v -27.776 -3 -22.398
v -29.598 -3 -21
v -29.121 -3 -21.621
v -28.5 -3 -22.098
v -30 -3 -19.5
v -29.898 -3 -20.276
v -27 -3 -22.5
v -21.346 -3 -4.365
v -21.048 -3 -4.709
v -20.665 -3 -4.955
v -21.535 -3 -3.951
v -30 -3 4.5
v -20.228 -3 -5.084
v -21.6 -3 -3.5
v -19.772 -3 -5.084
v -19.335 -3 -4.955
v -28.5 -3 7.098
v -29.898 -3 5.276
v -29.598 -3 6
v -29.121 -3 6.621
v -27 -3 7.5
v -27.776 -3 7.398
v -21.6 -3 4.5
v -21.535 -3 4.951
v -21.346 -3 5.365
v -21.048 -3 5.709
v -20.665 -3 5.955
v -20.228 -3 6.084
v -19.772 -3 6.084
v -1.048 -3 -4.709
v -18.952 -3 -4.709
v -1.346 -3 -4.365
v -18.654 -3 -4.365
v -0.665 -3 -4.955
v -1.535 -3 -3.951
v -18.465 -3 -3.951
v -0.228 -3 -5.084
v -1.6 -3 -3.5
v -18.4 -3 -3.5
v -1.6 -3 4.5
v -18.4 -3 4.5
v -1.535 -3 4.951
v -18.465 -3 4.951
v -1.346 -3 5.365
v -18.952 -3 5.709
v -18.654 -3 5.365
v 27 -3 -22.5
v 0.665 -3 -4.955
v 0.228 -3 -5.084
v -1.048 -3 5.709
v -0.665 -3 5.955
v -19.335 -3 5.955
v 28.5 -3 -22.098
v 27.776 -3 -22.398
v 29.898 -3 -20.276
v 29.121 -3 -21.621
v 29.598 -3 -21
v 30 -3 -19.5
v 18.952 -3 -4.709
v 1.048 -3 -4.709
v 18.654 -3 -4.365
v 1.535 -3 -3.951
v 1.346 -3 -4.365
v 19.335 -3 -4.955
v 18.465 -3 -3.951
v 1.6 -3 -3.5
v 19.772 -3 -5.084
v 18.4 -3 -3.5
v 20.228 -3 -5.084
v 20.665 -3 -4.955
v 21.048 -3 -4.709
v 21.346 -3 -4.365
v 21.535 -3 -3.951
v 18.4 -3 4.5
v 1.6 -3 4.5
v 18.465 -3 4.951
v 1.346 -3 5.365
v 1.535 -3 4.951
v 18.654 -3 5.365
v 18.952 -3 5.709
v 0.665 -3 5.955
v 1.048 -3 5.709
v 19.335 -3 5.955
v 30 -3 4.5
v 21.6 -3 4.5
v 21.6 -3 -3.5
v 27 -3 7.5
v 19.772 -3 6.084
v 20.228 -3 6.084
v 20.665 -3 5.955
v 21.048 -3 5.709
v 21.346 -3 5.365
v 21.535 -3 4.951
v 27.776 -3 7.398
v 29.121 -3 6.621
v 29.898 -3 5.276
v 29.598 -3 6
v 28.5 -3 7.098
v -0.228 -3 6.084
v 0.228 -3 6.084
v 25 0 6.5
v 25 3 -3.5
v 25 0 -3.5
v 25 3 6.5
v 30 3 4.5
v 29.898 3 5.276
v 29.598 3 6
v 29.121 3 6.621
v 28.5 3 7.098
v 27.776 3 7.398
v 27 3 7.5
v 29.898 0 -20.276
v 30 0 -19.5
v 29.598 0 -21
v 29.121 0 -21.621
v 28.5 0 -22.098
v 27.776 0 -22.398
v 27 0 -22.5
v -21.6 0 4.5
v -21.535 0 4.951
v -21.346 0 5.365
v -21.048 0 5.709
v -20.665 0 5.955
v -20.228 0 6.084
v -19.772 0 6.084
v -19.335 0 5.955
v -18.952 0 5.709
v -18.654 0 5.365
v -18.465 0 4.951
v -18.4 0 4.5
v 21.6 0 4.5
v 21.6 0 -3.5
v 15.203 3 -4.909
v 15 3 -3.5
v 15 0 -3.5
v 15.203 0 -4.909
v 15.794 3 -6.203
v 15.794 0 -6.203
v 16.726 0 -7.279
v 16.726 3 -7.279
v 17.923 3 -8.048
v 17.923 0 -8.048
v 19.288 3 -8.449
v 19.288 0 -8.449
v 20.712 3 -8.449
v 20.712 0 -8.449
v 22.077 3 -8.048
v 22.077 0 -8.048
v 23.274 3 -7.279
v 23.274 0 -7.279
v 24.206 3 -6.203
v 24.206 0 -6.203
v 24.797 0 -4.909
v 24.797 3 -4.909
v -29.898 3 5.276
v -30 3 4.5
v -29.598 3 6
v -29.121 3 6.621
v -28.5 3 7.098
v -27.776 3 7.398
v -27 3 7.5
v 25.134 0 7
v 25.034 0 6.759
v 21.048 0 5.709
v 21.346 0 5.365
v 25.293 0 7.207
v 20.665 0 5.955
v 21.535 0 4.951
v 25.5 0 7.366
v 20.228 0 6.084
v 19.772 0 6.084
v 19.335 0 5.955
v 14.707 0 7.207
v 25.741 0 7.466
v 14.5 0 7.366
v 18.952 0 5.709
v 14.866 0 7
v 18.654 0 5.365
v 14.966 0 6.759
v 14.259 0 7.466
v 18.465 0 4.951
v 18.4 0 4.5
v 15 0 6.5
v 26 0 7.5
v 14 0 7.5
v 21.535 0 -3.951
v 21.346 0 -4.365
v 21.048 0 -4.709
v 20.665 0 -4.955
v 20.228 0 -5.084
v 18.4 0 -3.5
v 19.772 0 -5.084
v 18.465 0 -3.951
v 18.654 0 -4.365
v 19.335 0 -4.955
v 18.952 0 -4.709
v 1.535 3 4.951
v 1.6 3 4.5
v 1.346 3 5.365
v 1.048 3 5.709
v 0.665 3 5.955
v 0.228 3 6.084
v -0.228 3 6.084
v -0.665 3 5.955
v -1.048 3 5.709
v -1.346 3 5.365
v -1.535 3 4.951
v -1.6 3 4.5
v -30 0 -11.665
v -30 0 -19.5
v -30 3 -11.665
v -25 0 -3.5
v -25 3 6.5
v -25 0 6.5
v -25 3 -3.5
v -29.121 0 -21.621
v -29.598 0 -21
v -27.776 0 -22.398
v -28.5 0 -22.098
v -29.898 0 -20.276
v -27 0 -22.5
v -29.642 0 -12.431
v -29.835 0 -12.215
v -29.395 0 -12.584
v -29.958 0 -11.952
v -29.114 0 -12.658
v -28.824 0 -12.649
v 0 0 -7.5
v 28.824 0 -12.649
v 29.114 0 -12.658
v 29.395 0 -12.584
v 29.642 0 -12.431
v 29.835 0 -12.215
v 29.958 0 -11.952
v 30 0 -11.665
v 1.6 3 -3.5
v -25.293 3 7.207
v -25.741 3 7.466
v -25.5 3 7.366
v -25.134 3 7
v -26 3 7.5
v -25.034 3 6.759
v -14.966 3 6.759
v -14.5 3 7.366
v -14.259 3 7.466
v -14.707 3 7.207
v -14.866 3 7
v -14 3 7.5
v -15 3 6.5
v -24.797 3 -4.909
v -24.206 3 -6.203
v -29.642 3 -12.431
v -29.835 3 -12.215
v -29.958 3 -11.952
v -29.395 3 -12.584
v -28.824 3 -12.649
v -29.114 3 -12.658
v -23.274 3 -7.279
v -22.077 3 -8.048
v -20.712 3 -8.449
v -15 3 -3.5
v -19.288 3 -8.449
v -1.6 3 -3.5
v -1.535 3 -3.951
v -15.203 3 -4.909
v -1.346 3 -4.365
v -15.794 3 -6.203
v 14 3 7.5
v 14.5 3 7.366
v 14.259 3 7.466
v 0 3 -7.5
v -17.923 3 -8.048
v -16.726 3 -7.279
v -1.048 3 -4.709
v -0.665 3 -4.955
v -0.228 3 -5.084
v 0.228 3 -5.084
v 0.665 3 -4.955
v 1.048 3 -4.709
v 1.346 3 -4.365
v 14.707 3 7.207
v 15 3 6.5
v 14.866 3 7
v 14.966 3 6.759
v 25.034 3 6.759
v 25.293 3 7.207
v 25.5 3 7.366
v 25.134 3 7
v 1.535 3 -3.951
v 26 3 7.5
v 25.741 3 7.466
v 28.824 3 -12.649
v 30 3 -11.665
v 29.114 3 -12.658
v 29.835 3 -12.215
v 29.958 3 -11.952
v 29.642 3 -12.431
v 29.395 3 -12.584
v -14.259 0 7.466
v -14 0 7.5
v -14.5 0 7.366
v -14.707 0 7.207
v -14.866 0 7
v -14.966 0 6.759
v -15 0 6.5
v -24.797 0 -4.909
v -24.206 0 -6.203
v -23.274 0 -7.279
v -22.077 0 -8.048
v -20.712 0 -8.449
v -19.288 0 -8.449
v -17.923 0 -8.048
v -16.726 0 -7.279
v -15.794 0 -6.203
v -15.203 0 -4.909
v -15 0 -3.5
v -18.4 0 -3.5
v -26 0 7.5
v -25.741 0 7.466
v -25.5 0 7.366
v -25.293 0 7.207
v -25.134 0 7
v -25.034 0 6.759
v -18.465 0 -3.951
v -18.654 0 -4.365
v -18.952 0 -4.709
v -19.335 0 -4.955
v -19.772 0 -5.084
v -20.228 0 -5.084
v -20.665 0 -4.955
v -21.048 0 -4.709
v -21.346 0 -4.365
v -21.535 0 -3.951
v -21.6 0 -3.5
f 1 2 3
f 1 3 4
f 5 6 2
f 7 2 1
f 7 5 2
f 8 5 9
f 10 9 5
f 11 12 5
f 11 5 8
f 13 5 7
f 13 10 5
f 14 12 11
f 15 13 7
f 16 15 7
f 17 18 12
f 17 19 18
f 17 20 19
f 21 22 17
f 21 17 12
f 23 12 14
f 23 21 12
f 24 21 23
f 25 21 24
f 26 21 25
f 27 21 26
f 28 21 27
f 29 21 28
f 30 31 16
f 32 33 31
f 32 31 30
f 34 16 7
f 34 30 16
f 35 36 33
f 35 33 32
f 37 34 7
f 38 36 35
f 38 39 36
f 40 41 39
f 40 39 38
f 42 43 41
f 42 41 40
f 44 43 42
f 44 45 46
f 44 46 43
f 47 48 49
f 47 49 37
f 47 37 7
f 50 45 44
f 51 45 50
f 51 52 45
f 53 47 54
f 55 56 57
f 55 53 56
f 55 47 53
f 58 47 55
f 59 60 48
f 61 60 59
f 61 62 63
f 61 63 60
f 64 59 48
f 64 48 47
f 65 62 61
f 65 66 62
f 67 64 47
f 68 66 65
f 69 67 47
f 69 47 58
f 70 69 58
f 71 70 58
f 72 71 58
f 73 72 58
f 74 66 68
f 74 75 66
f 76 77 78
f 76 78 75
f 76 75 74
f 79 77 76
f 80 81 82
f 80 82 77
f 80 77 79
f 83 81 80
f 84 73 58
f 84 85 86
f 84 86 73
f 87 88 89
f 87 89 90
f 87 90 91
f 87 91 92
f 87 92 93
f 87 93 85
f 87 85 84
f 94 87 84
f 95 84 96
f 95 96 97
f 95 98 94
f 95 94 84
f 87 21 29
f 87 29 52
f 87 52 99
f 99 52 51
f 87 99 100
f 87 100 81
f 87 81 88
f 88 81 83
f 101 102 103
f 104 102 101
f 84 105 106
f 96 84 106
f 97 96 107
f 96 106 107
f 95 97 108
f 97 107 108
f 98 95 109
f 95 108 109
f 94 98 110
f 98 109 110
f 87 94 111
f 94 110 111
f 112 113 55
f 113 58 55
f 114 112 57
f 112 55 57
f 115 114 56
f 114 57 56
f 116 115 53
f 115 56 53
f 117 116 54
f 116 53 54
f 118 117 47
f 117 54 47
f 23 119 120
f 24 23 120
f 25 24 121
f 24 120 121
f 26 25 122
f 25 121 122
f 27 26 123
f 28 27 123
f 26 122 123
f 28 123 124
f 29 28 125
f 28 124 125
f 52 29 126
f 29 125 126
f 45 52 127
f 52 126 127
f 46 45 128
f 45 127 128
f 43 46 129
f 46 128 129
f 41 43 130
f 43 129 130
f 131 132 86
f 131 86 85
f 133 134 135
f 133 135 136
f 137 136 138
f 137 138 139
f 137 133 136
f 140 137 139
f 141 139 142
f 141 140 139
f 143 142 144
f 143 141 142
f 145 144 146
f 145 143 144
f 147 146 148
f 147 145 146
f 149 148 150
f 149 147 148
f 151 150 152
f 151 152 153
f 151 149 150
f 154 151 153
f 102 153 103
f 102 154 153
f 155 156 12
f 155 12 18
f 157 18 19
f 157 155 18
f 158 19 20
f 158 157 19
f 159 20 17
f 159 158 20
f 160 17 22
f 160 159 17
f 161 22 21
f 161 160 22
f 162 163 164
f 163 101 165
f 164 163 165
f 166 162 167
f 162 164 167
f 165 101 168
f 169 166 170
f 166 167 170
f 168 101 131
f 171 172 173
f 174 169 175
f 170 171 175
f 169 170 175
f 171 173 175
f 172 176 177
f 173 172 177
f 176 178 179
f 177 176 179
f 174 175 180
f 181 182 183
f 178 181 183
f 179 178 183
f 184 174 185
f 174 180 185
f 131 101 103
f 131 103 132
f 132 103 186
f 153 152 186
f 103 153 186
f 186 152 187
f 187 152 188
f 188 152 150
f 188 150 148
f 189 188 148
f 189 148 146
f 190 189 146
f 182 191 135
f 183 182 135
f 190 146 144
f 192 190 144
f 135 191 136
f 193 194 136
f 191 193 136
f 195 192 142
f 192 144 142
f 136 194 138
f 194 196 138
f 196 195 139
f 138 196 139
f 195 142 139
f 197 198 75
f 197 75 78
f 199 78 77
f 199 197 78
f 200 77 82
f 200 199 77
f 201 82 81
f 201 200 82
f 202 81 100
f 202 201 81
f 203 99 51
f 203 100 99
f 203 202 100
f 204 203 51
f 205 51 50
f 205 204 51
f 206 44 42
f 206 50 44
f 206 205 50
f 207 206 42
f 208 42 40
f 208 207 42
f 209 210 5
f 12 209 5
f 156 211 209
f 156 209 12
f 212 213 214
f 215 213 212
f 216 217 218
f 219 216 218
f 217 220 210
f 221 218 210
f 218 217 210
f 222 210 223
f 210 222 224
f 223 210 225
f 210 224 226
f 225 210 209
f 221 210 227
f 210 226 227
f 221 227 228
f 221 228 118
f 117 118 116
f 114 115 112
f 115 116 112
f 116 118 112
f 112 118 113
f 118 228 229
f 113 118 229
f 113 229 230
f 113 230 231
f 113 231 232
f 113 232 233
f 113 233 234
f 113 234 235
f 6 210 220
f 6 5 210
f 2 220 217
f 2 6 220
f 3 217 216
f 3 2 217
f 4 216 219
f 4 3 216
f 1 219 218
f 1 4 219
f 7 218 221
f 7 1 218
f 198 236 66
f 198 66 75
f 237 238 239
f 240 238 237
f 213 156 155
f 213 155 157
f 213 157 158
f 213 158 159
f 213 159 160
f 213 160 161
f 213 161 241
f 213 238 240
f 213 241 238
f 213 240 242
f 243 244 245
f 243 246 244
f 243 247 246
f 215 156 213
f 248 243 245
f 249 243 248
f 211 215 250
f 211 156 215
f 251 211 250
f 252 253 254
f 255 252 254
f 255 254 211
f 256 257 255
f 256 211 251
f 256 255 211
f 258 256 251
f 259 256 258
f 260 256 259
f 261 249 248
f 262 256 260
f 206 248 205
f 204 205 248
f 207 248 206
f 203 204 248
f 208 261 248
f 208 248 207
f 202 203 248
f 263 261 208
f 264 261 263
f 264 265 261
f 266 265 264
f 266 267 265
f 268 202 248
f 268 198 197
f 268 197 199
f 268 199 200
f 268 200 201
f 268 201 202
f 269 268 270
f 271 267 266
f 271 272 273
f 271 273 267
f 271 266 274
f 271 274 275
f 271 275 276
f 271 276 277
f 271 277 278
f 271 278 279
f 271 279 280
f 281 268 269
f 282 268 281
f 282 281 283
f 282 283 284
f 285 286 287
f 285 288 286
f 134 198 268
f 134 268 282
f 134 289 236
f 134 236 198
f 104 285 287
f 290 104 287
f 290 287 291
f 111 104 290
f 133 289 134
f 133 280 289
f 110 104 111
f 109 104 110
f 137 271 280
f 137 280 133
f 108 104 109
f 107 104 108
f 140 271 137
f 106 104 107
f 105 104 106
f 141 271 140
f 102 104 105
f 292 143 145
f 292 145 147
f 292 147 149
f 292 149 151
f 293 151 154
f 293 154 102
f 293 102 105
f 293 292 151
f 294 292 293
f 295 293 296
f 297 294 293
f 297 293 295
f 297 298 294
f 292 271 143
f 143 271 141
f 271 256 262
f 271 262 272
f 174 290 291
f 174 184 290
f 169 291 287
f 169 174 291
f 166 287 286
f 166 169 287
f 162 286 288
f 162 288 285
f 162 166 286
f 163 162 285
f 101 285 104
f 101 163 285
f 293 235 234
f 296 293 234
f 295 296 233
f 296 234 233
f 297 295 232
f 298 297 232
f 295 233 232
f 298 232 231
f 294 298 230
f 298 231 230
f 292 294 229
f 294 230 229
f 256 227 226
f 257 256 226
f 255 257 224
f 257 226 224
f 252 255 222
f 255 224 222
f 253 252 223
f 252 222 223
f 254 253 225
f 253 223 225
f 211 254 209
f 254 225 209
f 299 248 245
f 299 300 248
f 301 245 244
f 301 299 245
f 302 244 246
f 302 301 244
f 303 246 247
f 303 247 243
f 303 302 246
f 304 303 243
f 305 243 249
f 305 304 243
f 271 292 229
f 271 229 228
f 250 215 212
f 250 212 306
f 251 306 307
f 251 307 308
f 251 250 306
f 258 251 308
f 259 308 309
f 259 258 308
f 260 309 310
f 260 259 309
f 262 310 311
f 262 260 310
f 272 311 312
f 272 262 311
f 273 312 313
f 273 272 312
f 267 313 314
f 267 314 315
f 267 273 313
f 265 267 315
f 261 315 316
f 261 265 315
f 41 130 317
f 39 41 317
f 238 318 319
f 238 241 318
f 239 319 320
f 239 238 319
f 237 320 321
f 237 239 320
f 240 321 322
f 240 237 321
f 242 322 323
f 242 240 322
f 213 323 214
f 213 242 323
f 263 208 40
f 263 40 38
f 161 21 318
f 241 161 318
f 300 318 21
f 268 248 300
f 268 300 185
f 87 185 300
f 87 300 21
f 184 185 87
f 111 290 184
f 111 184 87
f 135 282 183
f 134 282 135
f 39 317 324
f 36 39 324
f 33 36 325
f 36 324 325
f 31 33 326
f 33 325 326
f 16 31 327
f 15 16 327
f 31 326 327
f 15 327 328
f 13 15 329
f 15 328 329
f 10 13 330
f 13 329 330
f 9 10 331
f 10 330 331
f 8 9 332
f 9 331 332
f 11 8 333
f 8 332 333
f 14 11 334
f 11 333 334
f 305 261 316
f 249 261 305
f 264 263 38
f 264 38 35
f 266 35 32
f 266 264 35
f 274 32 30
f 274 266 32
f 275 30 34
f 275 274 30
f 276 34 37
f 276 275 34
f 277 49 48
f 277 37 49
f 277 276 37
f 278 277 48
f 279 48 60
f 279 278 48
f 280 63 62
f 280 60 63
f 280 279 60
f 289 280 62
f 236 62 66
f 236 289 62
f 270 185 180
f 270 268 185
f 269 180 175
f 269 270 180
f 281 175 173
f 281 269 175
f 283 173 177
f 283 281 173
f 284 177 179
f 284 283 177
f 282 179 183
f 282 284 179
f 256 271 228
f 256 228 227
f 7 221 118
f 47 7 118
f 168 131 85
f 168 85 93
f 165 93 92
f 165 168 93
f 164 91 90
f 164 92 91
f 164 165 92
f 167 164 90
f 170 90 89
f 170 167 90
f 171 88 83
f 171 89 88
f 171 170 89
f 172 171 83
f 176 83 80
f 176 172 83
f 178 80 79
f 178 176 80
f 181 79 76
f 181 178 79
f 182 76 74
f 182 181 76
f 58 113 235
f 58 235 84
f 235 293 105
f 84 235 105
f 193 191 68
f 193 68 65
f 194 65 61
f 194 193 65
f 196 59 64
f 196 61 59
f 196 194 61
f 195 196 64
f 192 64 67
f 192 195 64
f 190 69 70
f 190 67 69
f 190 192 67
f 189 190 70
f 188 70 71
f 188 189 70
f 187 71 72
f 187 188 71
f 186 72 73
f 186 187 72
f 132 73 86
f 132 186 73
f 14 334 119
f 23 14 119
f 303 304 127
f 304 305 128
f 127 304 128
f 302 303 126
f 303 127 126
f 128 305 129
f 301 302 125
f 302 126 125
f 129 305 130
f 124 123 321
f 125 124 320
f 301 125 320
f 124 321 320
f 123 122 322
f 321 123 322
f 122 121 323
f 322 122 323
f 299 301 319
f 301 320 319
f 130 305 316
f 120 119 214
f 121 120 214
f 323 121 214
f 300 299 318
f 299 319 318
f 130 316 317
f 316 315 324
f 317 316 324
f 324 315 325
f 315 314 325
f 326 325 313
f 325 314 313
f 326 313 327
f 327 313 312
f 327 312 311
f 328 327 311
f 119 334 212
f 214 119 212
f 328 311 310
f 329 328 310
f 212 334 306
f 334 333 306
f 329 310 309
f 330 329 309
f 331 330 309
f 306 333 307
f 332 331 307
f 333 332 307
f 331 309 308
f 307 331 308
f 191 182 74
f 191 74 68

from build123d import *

# Parameters (mm, degrees)
BOSS_EXTRUDE1_DEPTH = 3
SKETCH4_W           = 60
SKETCH4_H           = 30
BOSS_EXTRUDE2_DEPTH = 3
FILLET1_R           = 3
CUT_EXTRUDE1_DEPTH  = 38.976966704
BOSS_EXTRUDE3_DEPTH = 3
CUT_EXTRUDE2_DEPTH  = 3
FILLET2_R           = 1


with BuildPart() as part:
    # Sketch2 → Boss-Extrude1 (new body)
    with BuildSketch(Plane(origin=(0, 0, 0), x_dir=(1, 0, 0), z_dir=(0, 1, 0))):
        with BuildLine():
            Line((-30, -7.5), (30, -7.5))
            Line((30, -7.5), (30, 11.664728706))
            ThreePointArc((30, 11.664728706), (29.572172135, 12.484862261), (28.654761905, 12.60324384))
            ThreePointArc((28.654761905, 12.60324384), (0, 7.5), (-28.654761905, 12.60324384))
            ThreePointArc((-28.654761905, 12.60324384), (-29.572172135, 12.484862261), (-30, 11.664728706))
            Line((-30, 11.664728706), (-30, -7.5))
        make_face()
    extrude(amount=BOSS_EXTRUDE1_DEPTH)

    # Sketch4 → Boss-Extrude2 (add)
    with BuildSketch(Plane.XZ):
        with Locations((0, -7.5)):
            Rectangle(SKETCH4_W, SKETCH4_H)
    extrude(amount=BOSS_EXTRUDE2_DEPTH)

    # Fillet1
    fillet1_edges = [part.edges().sort_by_distance(p)[0] for p in [
        (30, -1.5, -22.5),
        (30, 0, 7.5),
        (-30, 0, 7.5),
        (-30, -1.5, -22.5),
    ]]
    fillet(fillet1_edges, radius=FILLET1_R)

    # Sketch5 → Cut-Extrude1 (cut, through all)
    with BuildSketch(Plane(origin=(0, 3, 0), x_dir=(1, 0, 0), z_dir=(0, 1, 0))):
        with BuildLine():
            Line((1.6, 3.5), (1.6, -4.5))
            ThreePointArc((1.6, -4.5), (0, -6.1), (-1.6, -4.5))
            Line((-1.6, -4.5), (-1.6, 3.5))
            ThreePointArc((-1.6, 3.5), (0, 5.1), (1.6, 3.5))
        make_face()
        with BuildLine():
            Line((21.6, 3.5), (21.6, -4.5))
            ThreePointArc((21.6, -4.5), (20, -6.1), (18.4, -4.5))
            Line((18.4, -4.5), (18.4, 3.5))
            ThreePointArc((18.4, 3.5), (20, 5.1), (21.6, 3.5))
        make_face()
        with BuildLine():
            Line((-21.6, 3.5), (-21.6, -4.5))
            ThreePointArc((-21.6, -4.5), (-20, -6.1), (-18.4, -4.5))
            Line((-18.4, -4.5), (-18.4, 3.5))
            ThreePointArc((-18.4, 3.5), (-20, 5.1), (-21.6, 3.5))
        make_face()
    extrude(amount=-CUT_EXTRUDE1_DEPTH, mode=Mode.SUBTRACT)

    # Sketch6 → Boss-Extrude3 (add)
    with BuildSketch(Plane(origin=(0, 3, 0), x_dir=(1, 0, 0), z_dir=(0, 1, 0))):
        with BuildLine():
            Line((0, 7.5), (-28.824143961, 12.649144601))
            ThreePointArc((-28.824143961, 12.649144601), (-29.64192833, 12.43149335), (-30, 11.664728706))
            Line((-30, 11.664728706), (-30, -4.5))
            ThreePointArc((-30, -4.5), (-29.121320344, -6.621320344), (-27, -7.5))
            Line((-27, -7.5), (27, -7.5))
            ThreePointArc((27, -7.5), (29.121320344, -6.621320344), (30, -4.5))
            Line((30, -4.5), (30, 11.664728706))
            ThreePointArc((30, 11.664728706), (29.64192833, 12.43149335), (28.824143961, 12.649144601))
            Line((28.824143961, 12.649144601), (0, 7.5))
        make_face()
        with BuildLine():
            Line((-18.4, -4.5), (-18.4, 3.5))
            ThreePointArc((-18.4, 3.5), (-20, 5.1), (-21.6, 3.5))
            Line((-21.6, 3.5), (-21.6, -4.5))
            ThreePointArc((-21.6, -4.5), (-20, -6.1), (-18.4, -4.5))
        make_face(mode=Mode.SUBTRACT)
        with BuildLine():
            Line((1.6, -4.5), (1.6, 3.5))
            ThreePointArc((1.6, 3.5), (0, 5.1), (-1.6, 3.5))
            Line((-1.6, 3.5), (-1.6, -4.5))
            ThreePointArc((-1.6, -4.5), (0, -6.1), (1.6, -4.5))
        make_face(mode=Mode.SUBTRACT)
        with BuildLine():
            Line((21.6, -4.5), (21.6, 3.5))
            ThreePointArc((21.6, 3.5), (20, 5.1), (18.4, 3.5))
            Line((18.4, 3.5), (18.4, -4.5))
            ThreePointArc((18.4, -4.5), (20, -6.1), (21.6, -4.5))
        make_face(mode=Mode.SUBTRACT)
    extrude(amount=-BOSS_EXTRUDE3_DEPTH)

    # Sketch7 → Cut-Extrude2 (cut)
    with BuildSketch(Plane(origin=(0, 3, 0), x_dir=(1, 0, 0), z_dir=(0, 1, 0))):
        with BuildLine():
            Line((-15, 3.5), (-15, -15.7))
            ThreePointArc((-15, -15.7), (-20, -20.7), (-25, -15.7))
            Line((-25, -15.7), (-25, 3.5))
            ThreePointArc((-25, 3.5), (-20, 8.5), (-15, 3.5))
        make_face()
        with BuildLine():
            Line((25, 3.5), (25, -15.7))
            ThreePointArc((25, -15.7), (20, -20.7), (15, -15.7))
            Line((15, -15.7), (15, 3.5))
            ThreePointArc((15, 3.5), (20, 8.5), (25, 3.5))
        make_face()
    extrude(amount=-CUT_EXTRUDE2_DEPTH, mode=Mode.SUBTRACT)

    # Fillet2
    fillet2_edges = [part.edges().sort_by_distance(p)[0] for p in [
        (-15, 1.5, 7.5),
        (-25, 1.5, 7.5),
        (25, 1.5, 7.5),
        (15, 1.5, 7.5),
    ]]
    fillet(fillet2_edges, radius=FILLET2_R)


solid = part.part
